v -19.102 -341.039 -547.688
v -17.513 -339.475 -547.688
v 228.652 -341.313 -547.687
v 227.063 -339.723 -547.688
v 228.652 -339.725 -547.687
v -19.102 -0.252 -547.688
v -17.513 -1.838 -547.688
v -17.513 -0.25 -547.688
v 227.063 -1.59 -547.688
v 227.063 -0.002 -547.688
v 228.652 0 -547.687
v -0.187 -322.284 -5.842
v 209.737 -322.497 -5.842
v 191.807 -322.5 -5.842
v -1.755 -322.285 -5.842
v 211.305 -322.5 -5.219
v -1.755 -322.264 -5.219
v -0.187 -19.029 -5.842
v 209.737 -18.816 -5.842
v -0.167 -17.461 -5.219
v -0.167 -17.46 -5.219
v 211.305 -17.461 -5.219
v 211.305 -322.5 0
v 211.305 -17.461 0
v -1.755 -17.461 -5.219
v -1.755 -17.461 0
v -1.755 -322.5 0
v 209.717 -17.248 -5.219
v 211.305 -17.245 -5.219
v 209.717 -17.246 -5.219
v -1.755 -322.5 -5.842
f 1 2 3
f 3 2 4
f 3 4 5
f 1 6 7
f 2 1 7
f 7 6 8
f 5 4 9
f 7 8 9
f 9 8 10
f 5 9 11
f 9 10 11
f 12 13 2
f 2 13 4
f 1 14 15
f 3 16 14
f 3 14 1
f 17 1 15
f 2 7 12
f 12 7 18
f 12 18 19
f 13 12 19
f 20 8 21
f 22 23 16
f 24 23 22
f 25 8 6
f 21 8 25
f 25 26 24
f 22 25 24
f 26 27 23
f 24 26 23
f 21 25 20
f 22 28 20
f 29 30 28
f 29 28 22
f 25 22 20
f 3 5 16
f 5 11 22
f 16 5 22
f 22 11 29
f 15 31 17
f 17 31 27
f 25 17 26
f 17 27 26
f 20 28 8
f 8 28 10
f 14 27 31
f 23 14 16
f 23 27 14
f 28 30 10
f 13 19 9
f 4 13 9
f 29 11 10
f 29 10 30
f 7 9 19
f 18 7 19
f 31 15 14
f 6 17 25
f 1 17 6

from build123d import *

# Parameters (mm, degrees)
BOSS_EXTRUDE1_DEPTH = 339.725
BOSS_EXTRUDE2_REACH = 691.724
CUT_EXTRUDE4_DEPTH  = 697.975102984
SKETCH6_W           = 376.513172643
SKETCH6_H           = 53.606624692
CUT_EXTRUDE8_DEPTH  = 692.004787475
SKETCH7_W           = 213.060365226
SKETCH7_H           = 305.038721392
BOSS_EXTRUDE4_DEPTH = 5.842


with BuildPart() as part:
    # Sketch1 → Boss-Extrude1 (new body)
    with BuildSketch(Plane(origin=(0, 0, 0), x_dir=(1, 0, 0), z_dir=(0, 1, 0))):
        Polygon((0, 0), (209.55, 0), (227.063263081, 547.6875), (228.651574493, 547.6875), (211.08754833, -1.5875), (-1.53754833, -1.5875), (-19.101574493, 547.6875), (-17.513263081, 547.6875), align=None)
    extrude(amount=-BOSS_EXTRUDE1_DEPTH)

    # Boss-Extrude2: up to this plane
    boss_extrude2_end = Plane(origin=(-19.101574493, -339.725, -547.6875), z_dir=(-0.9994891356560206, 0, 0.03196040840760531))
    # Sketch3 → Boss-Extrude2 (add, up to the surface)
    with BuildSketch(Plane(origin=(210.922640445, 0, 6.744619317), x_dir=(0.031960408407605376, 0, -0.9994891356560207), z_dir=(0.9994891356560207, 0, 0.031960408407605376)), mode=Mode.PRIVATE) as boss_extrude2_sk1:
        Polygon((5.20194578, -17.461159368), (554.715503688, 0), (554.715503688, -1.588301242), (5.210173674, -19.049199163), align=None)
    boss_extrude2_tool1 = split(extrude(boss_extrude2_sk1.sketch, amount=-BOSS_EXTRUDE2_REACH, mode=Mode.PRIVATE), bisect_by=boss_extrude2_end, keep=Keep.BOTH, mode=Mode.PRIVATE)
    add(boss_extrude2_tool1.solids().sort_by_distance((219.870301, -9.524663, -273.07314))[0])
    # Sketch3 → Boss-Extrude2 (add, up to the surface)
    with BuildSketch(Plane(origin=(210.922640445, 0, 6.744619317), x_dir=(0.031960408407605376, 0, -0.9994891356560207), z_dir=(0.9994891356560207, 0, 0.031960408407605376)), mode=Mode.PRIVATE) as boss_extrude2_sk2:
        Polygon((5.159755252, -322.2625), (554.715503688, -339.725), (554.715503688, -341.313301242), (5.159755252, -323.850801242), align=None)
    boss_extrude2_tool2 = split(extrude(boss_extrude2_sk2.sketch, amount=-BOSS_EXTRUDE2_REACH, mode=Mode.PRIVATE), bisect_by=boss_extrude2_end, keep=Keep.BOTH, mode=Mode.PRIVATE)
    add(boss_extrude2_tool2.solids().sort_by_distance((219.869561, -331.787901, -273.05))[0])

    # Sketch5 → Cut-Extrude4 (cut, through all)
    with BuildSketch(Plane(origin=(210.922640445, 0, 6.744619317), x_dir=(0.031960408407605376, 0, -0.9994891356560207), z_dir=(0.9994891356560207, 0, 0.031960408407605376))):
        Polygon((5.159755252, -322.263840612), (554.715503688, -341.313301242), (-187.514814981, -341.313301242), align=None)
        Polygon((5.159755252, -17.461159388), (-85.492186458, -17.461159388), (-85.492186458, 58.963399127), (554.715503688, 0), align=None)
    extrude(amount=-CUT_EXTRUDE4_DEPTH, mode=Mode.SUBTRACT)

    # Sketch6 → Cut-Extrude8 (cut, through all)
    with BuildSketch(Plane(origin=(0, 0, 0), x_dir=(1, 0, 0), z_dir=(0, 1, 0))):
        Polygon((-1.755182613, 5.218517559), (295.768737434, 5.218517559), (295.768737434, -74.400442216), (-24.623288418, -74.400442216), align=None)
        with Locations((124.241384065, 574.490812346)):
            Rectangle(SKETCH6_W, SKETCH6_H)
    extrude(amount=-CUT_EXTRUDE8_DEPTH, mode=Mode.SUBTRACT)

    # Sketch7 → Boss-Extrude4 (add)
    with BuildSketch(Plane.XY):
        with Locations((104.775, -169.980520084)):
            Rectangle(SKETCH7_W, SKETCH7_H)
    extrude(amount=-BOSS_EXTRUDE4_DEPTH)


solid = part.part
